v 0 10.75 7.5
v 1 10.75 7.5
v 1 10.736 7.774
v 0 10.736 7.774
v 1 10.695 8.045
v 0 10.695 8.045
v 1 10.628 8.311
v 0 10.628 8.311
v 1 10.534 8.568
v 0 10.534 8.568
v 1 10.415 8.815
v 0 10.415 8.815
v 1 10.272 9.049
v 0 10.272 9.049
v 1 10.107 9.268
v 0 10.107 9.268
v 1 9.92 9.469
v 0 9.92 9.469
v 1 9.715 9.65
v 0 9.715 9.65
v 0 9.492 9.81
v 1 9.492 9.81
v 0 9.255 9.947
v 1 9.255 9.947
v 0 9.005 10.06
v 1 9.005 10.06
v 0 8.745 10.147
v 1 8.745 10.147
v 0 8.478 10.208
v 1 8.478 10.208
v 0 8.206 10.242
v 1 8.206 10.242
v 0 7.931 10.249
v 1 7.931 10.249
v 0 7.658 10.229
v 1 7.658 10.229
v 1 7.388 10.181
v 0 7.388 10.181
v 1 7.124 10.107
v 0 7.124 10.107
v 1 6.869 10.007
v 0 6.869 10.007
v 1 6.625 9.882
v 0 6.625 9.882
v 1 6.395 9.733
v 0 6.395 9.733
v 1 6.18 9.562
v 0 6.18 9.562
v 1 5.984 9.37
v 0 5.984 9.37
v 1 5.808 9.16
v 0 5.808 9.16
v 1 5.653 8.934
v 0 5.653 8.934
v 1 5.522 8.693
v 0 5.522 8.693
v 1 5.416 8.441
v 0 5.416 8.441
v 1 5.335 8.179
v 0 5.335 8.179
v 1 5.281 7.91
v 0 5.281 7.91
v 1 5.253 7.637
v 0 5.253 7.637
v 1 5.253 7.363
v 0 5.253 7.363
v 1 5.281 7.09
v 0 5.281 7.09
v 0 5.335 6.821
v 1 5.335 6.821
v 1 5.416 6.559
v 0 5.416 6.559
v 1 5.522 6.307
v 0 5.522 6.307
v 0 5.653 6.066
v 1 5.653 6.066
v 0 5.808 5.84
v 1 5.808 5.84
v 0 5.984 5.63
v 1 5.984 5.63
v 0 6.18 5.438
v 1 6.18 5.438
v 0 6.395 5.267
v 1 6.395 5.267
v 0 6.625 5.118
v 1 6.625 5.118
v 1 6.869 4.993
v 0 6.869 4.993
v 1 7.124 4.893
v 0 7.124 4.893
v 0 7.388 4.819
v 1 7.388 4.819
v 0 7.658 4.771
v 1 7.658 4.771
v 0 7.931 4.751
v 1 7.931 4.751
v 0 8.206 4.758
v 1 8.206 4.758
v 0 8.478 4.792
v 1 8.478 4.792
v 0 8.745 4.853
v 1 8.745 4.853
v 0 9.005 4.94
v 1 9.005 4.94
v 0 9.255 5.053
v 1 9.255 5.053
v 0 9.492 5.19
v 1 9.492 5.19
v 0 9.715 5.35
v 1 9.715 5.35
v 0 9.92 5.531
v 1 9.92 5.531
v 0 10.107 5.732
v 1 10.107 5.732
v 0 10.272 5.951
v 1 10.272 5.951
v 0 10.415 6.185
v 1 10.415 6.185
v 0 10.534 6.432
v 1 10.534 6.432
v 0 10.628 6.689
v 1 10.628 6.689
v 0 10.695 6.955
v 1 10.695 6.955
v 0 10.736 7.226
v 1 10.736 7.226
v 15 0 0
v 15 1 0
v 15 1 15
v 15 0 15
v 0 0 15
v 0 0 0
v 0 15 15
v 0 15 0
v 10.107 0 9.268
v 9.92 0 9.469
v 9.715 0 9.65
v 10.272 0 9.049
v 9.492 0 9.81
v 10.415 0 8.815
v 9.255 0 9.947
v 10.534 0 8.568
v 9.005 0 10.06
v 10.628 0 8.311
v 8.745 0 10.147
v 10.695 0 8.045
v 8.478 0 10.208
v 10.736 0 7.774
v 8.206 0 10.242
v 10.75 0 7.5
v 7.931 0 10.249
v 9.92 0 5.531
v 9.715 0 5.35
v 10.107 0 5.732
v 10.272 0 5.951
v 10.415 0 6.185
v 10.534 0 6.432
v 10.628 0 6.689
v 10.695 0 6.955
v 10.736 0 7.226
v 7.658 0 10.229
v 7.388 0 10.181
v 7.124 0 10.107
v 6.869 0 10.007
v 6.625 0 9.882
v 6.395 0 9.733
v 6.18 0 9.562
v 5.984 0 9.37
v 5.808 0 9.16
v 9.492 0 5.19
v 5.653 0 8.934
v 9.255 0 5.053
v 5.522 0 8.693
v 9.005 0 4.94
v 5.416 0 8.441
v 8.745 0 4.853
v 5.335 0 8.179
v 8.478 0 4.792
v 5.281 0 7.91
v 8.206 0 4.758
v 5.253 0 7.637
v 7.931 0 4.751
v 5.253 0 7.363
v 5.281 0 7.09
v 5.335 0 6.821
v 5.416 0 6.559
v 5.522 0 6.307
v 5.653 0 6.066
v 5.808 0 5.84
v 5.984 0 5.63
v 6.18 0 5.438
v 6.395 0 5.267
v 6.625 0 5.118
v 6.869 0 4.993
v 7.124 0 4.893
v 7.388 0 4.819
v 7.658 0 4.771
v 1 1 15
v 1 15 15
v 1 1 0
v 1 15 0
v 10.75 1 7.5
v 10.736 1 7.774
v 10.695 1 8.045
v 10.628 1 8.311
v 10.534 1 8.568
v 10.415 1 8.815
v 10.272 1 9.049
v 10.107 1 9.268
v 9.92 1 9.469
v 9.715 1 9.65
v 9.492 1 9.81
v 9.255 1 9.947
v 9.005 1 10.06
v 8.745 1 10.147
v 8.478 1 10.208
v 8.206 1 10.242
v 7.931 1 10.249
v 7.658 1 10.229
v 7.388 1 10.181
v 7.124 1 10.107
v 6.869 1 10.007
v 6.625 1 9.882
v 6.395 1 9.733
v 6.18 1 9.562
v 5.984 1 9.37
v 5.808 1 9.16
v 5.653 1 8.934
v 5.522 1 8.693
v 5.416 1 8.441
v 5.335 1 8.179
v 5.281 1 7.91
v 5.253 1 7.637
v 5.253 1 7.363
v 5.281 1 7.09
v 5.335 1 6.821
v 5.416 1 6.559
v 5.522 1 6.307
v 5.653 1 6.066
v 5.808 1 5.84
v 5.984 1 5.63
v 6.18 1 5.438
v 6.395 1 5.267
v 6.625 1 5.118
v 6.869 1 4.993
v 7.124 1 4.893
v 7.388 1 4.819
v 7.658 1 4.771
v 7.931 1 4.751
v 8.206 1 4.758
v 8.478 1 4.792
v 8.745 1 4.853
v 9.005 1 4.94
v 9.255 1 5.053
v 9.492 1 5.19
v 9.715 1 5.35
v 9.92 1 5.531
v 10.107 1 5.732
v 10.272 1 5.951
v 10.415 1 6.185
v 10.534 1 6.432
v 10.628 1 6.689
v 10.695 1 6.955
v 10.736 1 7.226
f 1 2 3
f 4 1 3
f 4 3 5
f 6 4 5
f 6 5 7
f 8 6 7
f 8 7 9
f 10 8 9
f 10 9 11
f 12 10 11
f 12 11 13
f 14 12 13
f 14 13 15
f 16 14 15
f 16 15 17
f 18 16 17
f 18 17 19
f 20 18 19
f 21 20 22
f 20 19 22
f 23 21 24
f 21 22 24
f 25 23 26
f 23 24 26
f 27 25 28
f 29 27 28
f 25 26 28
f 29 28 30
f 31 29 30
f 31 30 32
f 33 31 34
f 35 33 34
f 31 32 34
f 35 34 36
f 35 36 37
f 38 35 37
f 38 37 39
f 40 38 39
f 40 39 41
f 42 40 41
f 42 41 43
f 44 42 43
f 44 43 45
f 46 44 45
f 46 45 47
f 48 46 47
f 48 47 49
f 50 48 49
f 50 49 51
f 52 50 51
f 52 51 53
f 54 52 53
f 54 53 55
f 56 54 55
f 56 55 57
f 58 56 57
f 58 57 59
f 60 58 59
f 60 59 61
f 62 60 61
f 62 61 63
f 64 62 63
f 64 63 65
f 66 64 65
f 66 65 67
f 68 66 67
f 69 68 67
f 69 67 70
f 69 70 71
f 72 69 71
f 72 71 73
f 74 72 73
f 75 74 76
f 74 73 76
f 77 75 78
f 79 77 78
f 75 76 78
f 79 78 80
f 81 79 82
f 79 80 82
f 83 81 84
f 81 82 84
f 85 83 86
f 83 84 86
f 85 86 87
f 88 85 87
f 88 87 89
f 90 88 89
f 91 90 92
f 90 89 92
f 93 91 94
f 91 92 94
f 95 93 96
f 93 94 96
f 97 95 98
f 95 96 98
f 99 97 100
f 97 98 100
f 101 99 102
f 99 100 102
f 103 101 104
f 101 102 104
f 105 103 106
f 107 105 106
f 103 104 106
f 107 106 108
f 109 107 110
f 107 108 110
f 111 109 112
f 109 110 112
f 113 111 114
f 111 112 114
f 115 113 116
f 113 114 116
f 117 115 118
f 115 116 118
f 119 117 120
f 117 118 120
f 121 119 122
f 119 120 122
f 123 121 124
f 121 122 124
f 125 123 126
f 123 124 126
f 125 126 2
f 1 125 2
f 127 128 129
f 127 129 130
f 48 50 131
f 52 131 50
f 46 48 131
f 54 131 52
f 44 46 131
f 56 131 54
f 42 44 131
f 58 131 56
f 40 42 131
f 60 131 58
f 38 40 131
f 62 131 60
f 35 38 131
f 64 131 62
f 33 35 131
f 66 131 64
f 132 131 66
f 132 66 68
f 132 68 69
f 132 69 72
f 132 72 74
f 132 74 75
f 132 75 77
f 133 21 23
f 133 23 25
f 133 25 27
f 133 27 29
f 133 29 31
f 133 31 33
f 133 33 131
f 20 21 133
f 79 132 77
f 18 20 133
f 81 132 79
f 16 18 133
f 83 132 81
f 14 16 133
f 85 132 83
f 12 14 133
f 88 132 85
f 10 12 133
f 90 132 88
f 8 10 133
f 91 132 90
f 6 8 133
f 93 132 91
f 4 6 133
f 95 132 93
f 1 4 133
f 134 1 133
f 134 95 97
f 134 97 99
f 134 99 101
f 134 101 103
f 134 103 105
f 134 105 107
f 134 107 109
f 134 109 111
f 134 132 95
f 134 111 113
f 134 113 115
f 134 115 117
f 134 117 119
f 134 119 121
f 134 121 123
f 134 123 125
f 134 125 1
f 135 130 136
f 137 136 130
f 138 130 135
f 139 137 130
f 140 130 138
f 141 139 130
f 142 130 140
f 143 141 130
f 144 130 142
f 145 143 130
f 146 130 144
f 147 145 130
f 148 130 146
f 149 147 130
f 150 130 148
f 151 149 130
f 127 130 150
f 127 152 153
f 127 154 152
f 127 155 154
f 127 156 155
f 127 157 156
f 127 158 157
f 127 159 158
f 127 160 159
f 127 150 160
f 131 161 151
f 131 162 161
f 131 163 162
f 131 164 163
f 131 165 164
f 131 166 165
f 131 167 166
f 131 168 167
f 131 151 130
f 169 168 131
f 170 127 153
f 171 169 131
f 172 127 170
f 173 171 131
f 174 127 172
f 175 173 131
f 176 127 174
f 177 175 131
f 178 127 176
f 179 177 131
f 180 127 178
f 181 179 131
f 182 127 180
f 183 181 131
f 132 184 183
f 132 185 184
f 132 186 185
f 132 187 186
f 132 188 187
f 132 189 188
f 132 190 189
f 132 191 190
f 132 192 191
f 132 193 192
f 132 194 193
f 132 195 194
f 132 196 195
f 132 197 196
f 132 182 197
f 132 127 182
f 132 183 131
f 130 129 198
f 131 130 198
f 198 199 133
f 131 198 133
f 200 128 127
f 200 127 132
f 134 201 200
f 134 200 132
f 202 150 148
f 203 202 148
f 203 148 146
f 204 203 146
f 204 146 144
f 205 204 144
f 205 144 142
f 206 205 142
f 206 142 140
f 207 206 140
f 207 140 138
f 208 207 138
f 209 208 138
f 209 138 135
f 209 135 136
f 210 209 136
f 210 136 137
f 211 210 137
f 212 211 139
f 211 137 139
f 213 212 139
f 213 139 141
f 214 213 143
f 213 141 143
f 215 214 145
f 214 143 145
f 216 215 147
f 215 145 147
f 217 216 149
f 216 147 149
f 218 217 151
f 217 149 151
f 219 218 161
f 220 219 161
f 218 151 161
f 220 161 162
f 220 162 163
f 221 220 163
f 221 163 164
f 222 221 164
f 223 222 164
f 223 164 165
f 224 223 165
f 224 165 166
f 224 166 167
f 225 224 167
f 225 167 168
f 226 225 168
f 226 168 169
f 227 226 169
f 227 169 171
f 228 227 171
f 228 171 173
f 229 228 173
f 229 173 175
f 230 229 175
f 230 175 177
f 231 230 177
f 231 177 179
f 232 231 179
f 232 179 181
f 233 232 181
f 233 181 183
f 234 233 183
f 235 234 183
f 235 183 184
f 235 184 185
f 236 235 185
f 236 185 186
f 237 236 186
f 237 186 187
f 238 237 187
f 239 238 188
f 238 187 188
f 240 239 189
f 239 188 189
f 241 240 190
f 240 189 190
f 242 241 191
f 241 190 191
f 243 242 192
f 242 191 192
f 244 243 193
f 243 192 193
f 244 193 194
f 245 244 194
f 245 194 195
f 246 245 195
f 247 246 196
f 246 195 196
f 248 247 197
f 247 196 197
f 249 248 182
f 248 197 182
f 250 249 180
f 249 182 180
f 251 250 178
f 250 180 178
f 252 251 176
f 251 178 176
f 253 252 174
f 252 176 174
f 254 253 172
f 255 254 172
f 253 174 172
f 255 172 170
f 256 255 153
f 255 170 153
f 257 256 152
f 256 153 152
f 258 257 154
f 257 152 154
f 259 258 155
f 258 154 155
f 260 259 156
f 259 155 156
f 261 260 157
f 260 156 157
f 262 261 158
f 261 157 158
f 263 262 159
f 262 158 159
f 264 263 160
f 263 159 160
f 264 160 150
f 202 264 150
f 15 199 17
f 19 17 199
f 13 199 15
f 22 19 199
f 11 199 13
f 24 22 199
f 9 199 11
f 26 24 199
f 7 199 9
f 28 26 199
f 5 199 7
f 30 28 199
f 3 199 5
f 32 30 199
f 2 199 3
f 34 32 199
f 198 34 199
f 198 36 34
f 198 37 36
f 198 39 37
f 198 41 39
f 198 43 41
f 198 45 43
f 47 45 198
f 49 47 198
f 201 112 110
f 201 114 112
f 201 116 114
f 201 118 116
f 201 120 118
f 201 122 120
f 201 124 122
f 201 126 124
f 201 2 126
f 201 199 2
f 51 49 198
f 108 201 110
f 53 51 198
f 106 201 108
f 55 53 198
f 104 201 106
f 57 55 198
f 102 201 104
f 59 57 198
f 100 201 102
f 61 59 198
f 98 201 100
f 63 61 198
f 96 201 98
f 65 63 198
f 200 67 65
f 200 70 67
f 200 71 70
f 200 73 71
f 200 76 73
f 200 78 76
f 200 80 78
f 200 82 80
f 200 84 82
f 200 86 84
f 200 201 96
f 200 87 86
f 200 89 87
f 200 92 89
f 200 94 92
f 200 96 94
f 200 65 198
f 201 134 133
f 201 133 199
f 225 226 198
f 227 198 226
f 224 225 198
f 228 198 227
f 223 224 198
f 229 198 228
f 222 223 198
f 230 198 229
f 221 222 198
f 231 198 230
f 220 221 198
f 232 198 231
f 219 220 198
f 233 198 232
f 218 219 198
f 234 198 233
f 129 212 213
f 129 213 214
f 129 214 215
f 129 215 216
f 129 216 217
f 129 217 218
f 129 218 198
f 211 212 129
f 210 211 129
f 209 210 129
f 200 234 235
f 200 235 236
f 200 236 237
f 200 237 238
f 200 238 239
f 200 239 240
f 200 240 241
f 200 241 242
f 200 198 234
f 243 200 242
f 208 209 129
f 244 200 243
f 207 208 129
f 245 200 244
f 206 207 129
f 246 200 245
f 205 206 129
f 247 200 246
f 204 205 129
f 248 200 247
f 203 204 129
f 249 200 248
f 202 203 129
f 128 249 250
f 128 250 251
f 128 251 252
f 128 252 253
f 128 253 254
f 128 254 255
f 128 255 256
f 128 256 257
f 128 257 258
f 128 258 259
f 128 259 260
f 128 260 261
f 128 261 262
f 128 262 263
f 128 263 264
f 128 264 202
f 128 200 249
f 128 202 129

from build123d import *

# Parameters (mm, degrees)
BOSS_EXTRUDE1_DEPTH = 15
SKETCH2_R           = 2.75
CUT_EXTRUDE1_DEPTH  = 19.05
SKETCH3_R           = 2.75
CUT_EXTRUDE2_DEPTH  = 26.416530054


with BuildPart() as part:
    # Sketch1 → Boss-Extrude1 (new body)
    with BuildSketch(Plane.XY):
        Polygon((0, 0), (0, 15), (1, 15), (1, 1), (15, 1), (15, 0), align=None)
    extrude(amount=BOSS_EXTRUDE1_DEPTH)

    # Sketch2 → Cut-Extrude1 (cut)
    with BuildSketch(Plane(origin=(0, 0, 0), x_dir=(-1, 0, 0), z_dir=(0, -1, 0))):
        with Locations(Location((-8, -7.5, 0), (0, 0, 180))):
            Circle(SKETCH2_R)
    extrude(amount=-CUT_EXTRUDE1_DEPTH, mode=Mode.SUBTRACT)

    # Sketch3 → Cut-Extrude2 (cut, through all)
    with BuildSketch(Plane(origin=(1, 0, 0), x_dir=(0, 0, -1), z_dir=(1, 0, 0))):
        with Locations(Location((-7.5, 8, 0), (0, 0, 90))):
            Circle(SKETCH3_R)
    extrude(amount=-CUT_EXTRUDE2_DEPTH, mode=Mode.SUBTRACT)


solid = part.part
